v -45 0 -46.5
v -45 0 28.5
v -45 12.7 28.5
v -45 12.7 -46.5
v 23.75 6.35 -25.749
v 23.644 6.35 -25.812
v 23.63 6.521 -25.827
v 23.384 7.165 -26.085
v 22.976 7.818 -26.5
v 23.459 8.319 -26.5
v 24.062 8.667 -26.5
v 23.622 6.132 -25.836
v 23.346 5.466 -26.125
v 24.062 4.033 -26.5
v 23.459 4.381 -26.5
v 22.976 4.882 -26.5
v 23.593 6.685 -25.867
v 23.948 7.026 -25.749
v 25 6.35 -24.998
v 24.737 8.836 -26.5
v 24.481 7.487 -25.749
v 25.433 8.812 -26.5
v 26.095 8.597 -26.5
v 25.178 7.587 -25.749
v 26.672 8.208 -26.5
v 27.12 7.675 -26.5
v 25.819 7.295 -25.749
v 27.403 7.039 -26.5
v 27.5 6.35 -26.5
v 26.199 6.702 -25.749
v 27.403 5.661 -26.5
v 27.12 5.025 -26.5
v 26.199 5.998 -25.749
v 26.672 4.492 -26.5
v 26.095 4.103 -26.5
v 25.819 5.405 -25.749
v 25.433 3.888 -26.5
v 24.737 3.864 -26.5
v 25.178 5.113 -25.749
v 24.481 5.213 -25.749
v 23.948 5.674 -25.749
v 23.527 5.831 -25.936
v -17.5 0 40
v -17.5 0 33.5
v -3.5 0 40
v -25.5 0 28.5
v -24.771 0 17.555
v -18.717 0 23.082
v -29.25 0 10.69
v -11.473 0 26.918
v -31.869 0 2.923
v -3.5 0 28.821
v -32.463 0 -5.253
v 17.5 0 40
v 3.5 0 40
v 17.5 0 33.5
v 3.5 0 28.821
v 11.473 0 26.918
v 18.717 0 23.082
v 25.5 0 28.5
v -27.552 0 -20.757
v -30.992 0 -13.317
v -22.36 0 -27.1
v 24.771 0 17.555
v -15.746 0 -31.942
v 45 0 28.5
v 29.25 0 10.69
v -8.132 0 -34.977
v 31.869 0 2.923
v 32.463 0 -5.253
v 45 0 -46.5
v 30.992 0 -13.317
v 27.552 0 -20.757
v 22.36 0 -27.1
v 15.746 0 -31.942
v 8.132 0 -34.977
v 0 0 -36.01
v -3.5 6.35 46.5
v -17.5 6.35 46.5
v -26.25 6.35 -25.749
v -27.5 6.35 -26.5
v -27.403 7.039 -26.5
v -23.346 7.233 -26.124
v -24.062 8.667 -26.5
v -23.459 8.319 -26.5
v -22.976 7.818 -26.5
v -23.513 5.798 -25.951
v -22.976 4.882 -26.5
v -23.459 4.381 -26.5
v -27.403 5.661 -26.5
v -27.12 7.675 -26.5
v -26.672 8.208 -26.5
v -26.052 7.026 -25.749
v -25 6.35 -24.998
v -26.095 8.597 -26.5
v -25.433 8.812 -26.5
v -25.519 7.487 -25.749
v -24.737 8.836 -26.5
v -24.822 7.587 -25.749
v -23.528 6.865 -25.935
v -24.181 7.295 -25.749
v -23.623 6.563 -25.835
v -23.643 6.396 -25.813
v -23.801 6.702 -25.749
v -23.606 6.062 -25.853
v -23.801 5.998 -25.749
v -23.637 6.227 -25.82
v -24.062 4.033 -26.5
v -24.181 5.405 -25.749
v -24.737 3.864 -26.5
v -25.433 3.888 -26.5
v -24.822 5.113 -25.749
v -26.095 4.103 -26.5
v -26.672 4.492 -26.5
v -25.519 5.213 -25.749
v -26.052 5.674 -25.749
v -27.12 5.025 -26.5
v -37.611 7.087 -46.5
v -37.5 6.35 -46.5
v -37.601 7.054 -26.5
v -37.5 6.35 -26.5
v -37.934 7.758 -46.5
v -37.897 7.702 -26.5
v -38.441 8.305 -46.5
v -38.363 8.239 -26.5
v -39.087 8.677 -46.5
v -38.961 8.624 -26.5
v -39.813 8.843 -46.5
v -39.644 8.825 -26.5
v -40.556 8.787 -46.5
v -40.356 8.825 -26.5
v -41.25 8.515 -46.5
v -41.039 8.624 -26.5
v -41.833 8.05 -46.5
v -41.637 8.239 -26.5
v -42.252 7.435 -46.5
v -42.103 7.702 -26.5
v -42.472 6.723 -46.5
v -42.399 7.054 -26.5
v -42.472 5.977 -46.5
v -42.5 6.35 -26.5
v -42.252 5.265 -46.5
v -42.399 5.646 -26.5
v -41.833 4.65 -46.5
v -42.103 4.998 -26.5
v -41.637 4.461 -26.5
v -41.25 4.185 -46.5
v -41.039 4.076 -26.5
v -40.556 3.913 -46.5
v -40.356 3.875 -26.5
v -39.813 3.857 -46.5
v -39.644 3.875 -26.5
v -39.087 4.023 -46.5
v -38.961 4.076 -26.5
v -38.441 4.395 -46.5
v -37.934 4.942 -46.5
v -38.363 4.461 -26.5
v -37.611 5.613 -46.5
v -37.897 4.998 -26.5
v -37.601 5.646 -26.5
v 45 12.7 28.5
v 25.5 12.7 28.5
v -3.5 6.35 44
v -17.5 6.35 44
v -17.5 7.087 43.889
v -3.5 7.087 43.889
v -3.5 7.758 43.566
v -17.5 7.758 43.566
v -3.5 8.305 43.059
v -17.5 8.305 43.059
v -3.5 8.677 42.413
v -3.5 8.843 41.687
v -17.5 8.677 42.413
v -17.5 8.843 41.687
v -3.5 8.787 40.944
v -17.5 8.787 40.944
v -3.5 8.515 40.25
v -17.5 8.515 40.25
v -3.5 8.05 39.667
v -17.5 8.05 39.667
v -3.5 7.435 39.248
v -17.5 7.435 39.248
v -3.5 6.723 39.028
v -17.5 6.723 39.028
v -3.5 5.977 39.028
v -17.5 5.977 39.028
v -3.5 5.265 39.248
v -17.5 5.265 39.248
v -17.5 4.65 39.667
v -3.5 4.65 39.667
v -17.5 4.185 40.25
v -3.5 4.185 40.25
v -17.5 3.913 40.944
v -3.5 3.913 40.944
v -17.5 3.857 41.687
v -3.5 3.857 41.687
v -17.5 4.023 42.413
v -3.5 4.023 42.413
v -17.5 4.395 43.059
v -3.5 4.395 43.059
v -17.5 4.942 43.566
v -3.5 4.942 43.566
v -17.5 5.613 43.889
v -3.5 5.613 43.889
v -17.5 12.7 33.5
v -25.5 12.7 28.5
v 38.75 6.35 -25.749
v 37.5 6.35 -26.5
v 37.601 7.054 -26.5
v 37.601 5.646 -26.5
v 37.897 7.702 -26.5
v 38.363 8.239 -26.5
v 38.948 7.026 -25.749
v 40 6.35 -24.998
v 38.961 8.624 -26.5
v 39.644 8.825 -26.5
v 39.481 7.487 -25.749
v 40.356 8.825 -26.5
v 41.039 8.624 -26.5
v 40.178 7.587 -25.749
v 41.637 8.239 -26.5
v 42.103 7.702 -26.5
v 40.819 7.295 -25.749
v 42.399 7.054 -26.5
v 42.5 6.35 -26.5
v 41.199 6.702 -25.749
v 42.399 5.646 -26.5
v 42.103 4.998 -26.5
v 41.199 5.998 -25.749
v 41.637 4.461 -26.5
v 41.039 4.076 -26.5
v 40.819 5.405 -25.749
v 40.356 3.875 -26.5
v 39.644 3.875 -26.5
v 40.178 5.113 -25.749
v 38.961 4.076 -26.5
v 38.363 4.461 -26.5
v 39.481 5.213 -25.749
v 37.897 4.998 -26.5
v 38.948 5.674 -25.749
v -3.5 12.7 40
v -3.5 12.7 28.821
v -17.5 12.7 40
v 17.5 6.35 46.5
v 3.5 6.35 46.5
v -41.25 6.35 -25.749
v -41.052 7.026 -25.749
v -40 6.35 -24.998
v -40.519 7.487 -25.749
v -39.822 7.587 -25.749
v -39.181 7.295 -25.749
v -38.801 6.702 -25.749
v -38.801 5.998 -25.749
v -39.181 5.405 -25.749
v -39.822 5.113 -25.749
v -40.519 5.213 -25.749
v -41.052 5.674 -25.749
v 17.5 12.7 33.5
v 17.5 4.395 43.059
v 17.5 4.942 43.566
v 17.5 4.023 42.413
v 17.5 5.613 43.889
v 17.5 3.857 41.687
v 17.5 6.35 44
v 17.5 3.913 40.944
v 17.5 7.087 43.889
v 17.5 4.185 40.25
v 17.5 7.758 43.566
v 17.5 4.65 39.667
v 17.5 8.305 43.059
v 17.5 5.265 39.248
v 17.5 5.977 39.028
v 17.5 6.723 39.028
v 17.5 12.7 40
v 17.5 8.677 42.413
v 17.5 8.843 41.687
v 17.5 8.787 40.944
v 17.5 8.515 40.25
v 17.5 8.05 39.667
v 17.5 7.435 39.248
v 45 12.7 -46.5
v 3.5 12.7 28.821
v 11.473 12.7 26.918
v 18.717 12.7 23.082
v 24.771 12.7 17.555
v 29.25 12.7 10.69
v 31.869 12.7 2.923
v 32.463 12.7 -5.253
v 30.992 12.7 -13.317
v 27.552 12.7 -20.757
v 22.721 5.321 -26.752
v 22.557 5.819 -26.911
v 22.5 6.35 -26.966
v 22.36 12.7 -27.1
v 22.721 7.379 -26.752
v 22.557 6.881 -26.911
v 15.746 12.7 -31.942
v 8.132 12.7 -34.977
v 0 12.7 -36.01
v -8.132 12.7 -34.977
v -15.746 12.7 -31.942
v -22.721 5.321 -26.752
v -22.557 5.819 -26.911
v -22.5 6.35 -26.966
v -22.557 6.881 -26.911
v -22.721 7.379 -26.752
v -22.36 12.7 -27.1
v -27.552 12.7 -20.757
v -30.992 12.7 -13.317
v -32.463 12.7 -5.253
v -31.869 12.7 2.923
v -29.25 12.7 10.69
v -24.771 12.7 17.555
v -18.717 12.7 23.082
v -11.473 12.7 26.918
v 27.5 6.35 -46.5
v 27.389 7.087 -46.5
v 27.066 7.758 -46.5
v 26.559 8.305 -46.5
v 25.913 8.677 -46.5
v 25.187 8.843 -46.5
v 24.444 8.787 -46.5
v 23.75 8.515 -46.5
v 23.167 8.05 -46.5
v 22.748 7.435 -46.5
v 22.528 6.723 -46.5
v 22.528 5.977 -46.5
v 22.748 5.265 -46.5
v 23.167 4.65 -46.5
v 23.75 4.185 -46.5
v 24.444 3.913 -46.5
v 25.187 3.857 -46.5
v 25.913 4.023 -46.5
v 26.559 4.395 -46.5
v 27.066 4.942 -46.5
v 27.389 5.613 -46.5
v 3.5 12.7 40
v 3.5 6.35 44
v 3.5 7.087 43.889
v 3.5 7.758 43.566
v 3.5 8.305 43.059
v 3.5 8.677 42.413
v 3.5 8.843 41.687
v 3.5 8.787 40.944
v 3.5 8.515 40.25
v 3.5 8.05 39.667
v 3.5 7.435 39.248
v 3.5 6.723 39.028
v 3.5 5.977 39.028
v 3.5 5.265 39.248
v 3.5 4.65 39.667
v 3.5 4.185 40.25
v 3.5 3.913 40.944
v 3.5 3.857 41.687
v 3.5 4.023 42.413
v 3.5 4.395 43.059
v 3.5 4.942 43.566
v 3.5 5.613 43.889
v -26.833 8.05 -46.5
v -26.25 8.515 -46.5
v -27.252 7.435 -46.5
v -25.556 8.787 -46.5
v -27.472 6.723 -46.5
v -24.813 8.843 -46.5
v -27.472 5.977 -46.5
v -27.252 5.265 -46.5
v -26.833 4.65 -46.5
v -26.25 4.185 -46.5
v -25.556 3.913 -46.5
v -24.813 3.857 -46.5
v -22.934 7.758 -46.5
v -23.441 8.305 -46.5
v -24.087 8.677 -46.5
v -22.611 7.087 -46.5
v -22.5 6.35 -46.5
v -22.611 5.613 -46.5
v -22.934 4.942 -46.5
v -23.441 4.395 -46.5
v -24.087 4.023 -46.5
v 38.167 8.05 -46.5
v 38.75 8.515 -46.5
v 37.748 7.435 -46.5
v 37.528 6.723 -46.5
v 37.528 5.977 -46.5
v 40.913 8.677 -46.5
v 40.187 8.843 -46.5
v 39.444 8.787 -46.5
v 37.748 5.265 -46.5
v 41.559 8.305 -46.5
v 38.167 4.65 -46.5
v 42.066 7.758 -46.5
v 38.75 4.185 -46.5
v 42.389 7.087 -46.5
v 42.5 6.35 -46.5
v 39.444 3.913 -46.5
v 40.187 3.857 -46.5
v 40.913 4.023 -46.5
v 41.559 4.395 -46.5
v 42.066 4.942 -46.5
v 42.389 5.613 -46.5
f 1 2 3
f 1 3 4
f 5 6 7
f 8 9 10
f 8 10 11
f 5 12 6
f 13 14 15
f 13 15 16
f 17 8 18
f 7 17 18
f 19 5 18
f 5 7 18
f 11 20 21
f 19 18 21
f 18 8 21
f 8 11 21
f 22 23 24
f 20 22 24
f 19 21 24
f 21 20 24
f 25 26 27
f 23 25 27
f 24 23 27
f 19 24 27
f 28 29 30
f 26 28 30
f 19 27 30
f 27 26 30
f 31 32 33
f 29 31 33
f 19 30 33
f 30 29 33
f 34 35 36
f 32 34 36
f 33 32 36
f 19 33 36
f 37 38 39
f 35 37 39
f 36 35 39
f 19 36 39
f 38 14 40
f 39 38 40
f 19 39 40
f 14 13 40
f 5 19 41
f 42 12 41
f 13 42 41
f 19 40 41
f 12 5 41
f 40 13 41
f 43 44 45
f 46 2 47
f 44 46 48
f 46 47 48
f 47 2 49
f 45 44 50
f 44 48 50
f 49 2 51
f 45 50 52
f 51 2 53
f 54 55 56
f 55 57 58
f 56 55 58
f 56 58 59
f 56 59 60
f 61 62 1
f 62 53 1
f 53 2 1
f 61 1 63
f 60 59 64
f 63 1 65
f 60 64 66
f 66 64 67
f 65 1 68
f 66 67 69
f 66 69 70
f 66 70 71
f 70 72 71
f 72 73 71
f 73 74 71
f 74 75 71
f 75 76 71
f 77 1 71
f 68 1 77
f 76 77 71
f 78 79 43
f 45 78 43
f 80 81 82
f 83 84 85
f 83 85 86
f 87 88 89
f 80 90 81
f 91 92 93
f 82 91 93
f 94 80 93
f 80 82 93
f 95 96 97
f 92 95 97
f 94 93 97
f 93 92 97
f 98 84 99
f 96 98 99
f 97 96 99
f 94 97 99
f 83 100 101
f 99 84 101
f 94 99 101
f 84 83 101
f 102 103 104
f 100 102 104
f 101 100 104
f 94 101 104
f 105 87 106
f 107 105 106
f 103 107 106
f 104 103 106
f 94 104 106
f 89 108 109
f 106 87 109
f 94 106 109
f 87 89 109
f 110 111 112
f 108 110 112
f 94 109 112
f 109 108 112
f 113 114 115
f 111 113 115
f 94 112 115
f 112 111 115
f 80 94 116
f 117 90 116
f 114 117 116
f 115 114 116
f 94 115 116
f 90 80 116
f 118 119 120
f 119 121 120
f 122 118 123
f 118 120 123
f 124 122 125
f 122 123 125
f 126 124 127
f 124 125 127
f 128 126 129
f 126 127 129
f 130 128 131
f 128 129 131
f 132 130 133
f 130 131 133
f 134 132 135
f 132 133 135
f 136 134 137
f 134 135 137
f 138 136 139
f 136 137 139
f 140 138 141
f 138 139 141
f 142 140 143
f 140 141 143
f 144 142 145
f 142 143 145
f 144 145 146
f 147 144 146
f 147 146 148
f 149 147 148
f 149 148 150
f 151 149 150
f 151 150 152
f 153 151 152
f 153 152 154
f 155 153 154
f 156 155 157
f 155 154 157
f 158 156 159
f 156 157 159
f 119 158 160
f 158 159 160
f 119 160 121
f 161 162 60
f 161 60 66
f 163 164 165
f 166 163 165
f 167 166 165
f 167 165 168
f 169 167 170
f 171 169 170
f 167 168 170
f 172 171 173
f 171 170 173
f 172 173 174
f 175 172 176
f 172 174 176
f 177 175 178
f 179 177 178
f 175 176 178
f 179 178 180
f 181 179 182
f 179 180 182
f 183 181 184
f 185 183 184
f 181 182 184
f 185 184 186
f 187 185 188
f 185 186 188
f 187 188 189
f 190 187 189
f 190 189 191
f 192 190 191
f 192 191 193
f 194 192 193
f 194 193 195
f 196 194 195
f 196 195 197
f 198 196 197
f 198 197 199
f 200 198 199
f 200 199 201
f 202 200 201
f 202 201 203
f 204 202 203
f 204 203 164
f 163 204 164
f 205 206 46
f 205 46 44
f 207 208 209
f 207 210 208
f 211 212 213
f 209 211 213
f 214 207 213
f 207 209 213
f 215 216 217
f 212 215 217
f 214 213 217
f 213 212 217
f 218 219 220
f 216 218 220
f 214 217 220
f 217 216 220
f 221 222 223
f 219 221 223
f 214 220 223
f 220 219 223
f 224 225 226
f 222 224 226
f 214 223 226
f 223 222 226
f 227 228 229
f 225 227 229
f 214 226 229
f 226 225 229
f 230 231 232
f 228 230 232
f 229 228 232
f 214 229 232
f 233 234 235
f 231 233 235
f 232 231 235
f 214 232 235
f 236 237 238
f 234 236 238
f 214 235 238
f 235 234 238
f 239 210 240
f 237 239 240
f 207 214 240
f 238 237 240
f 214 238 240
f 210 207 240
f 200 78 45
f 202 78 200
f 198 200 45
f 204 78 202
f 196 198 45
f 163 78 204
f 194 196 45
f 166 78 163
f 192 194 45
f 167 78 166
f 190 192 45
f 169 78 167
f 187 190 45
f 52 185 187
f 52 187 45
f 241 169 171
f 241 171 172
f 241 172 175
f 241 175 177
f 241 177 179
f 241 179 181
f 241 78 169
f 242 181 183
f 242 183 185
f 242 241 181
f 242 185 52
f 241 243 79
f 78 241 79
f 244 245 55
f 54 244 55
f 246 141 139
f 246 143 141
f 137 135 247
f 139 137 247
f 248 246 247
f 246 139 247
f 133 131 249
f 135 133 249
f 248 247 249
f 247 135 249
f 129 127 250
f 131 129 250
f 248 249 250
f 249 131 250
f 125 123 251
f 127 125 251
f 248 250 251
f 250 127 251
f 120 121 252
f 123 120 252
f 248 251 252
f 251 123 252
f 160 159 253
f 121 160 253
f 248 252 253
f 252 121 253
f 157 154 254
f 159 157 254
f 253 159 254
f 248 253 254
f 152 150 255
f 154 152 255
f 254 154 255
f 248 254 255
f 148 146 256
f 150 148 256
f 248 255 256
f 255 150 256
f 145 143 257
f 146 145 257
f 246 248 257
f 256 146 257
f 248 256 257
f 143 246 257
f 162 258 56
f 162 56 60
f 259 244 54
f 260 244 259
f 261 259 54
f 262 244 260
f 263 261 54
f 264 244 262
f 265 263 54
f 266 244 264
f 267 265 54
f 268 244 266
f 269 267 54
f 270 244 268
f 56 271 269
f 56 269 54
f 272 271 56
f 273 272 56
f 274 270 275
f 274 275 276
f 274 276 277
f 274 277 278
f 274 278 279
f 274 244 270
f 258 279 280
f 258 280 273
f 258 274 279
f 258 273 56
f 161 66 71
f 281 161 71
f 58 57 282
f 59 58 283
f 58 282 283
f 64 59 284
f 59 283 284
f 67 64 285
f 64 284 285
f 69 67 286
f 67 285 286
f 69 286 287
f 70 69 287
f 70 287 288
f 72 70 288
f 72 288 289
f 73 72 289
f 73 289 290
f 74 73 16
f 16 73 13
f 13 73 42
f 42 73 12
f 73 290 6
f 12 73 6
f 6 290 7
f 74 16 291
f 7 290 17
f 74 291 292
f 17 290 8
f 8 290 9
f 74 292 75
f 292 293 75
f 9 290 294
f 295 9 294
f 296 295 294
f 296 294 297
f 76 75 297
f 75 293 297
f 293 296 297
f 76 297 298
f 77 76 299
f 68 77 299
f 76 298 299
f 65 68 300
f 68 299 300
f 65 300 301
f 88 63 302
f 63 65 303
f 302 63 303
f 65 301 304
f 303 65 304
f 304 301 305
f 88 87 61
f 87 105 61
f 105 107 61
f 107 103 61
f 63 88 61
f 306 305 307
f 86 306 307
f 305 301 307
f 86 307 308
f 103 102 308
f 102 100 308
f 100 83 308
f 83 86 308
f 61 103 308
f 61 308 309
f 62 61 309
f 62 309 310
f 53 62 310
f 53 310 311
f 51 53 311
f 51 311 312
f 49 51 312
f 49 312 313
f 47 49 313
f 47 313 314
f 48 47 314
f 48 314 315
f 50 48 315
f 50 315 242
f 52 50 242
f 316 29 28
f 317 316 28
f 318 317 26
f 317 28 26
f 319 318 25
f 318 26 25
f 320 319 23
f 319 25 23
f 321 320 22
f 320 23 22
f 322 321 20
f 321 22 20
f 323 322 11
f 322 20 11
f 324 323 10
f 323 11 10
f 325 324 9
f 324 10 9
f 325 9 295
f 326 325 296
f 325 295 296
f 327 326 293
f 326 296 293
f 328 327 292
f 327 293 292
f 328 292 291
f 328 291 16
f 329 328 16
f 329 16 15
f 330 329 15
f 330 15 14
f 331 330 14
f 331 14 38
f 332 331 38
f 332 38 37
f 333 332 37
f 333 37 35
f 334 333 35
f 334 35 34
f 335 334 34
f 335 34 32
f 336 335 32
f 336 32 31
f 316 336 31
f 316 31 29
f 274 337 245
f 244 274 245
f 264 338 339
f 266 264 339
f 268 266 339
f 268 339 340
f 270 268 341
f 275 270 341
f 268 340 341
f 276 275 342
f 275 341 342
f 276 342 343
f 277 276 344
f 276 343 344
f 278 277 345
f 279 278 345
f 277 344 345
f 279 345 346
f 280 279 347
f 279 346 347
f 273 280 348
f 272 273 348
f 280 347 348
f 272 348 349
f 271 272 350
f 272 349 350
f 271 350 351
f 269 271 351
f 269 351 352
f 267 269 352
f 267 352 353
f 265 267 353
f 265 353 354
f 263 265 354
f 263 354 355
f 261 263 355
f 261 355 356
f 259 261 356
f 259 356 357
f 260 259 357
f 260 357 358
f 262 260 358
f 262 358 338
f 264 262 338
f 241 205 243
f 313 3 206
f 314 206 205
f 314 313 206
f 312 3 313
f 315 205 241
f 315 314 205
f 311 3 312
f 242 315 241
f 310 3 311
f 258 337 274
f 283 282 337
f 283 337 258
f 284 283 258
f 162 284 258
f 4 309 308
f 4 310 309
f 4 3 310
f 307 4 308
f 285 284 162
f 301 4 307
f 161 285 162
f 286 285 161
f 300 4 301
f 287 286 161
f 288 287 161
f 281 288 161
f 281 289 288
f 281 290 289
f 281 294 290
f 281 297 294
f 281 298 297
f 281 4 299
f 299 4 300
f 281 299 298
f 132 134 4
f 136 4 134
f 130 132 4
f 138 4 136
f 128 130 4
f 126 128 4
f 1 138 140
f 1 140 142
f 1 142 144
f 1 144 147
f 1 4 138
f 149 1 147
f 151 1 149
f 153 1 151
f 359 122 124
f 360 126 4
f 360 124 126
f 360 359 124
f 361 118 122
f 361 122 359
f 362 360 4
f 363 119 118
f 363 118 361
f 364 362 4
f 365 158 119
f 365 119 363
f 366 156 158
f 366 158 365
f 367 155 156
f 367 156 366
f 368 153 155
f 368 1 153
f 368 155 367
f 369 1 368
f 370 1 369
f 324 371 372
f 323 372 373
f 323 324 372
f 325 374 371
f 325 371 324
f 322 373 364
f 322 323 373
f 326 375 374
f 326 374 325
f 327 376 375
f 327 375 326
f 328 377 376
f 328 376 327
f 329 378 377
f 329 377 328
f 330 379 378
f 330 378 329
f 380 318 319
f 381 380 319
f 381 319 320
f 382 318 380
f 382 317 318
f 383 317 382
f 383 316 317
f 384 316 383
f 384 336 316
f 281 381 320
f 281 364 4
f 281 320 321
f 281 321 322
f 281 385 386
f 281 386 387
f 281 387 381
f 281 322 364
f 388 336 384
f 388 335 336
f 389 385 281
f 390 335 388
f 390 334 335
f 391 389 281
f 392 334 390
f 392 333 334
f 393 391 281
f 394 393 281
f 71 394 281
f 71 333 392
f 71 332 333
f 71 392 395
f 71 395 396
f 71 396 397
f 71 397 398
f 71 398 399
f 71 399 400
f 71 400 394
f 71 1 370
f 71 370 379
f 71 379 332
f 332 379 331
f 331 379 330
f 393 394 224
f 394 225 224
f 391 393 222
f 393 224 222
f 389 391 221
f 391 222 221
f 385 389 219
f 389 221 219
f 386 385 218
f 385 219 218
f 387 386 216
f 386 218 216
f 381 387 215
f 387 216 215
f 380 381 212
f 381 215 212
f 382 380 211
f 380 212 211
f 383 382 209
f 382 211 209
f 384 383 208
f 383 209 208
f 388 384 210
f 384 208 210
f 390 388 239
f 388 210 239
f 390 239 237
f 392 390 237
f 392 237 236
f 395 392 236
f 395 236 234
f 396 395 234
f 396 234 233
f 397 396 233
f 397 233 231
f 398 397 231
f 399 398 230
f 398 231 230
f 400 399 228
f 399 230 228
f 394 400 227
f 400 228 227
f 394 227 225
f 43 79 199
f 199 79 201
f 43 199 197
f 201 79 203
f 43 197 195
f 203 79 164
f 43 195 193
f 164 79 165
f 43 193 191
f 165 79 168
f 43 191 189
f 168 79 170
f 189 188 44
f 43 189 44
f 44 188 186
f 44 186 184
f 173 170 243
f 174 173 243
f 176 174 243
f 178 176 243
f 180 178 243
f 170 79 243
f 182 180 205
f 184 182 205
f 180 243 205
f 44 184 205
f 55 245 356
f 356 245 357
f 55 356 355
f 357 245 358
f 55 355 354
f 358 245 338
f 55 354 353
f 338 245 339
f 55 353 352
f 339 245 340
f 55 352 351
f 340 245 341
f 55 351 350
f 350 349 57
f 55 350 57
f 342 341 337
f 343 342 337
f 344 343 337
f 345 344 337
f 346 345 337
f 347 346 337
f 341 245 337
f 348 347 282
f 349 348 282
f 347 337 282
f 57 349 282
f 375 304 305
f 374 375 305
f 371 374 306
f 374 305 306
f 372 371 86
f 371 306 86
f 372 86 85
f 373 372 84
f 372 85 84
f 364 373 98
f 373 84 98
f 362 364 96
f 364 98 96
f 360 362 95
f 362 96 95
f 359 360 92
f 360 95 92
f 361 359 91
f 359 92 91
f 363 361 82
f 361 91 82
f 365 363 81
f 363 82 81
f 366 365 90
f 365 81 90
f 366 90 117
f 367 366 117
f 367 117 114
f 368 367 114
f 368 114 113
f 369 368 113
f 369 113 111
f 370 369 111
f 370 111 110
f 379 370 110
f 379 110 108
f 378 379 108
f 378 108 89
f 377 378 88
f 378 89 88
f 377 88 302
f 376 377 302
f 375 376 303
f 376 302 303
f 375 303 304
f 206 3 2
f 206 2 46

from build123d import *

# Parameters (mm, degrees)
ESBO_O1_W                          = 90
ESBO_O1_H                          = 93
RESSALTO_EXTRUS_O1_DEPTH           = 12.7
ESBO_O3_R                          = 32.51
CORTE_EXTRUS_O2_DEPTH              = 66.943460631
CORTE_EXTRUS_O4_REACH              = 67.943
ESBO_O5_W                          = 27.5
ESBO_O5_H                          = 13
CORTE_EXTRUS_O5_REACH              = 67.943
ESBO_O6_W                          = 7
ESBO_O6_H                          = 26.329700269
CORTE_EXTRUS_O6_REACH              = 80.929
ESBO_O7_R                          = 2.5
CORTE_EXTRUS_O7_REACH              = 80.929
CORTE_EXTRUS_O8_DEPTH              = 66.943460631
TALADRO_DE_MARGEN_PARA_00001_D     = 5
TALADRO_DE_MARGEN_PARA_00001_DEPTH = 20
TALADRO_DE_MARGEN_PARA_00001_TIP   = 1.502151548


with BuildPart() as part:
    # Esboço1 → Ressalto-extrusão1 (new body)
    with BuildSketch(Plane(origin=(0, 0, 0), x_dir=(1, 0, 0), z_dir=(0, 1, 0))):
        Rectangle(ESBO_O1_W, ESBO_O1_H)
    extrude(amount=RESSALTO_EXTRUS_O1_DEPTH)

    # Esboço3 → Corte-extrusão2 (cut, through all)
    with BuildSketch(Plane(origin=(0, 12.7, 0), x_dir=(1, 0, 0), z_dir=(0, 1, 0))):
        with Locations(Location((0, 3.5, 0), (0, 0, 270))):
            Circle(ESBO_O3_R)
    extrude(amount=-CORTE_EXTRUS_O2_DEPTH, mode=Mode.SUBTRACT)

    # Esboço5 → Corte-extrusão4 (cut, up to next)
    with BuildSketch(Plane(origin=(0, 12.7, 0), x_dir=(1, 0, 0), z_dir=(0, 1, 0)), mode=Mode.PRIVATE) as corte_extrus_o4_sk1:
        with Locations((31.25, -40)):
            Rectangle(ESBO_O5_W, ESBO_O5_H)
    corte_extrus_o4_tool1 = extrude(corte_extrus_o4_sk1.sketch, amount=-CORTE_EXTRUS_O4_REACH, mode=Mode.PRIVATE) & part.part
    # Esboço5 → Corte-extrusão4 (cut, up to next)
    with BuildSketch(Plane(origin=(0, 12.7, 0), x_dir=(1, 0, 0), z_dir=(0, 1, 0)), mode=Mode.PRIVATE) as corte_extrus_o4_sk2:
        with Locations((-31.25, -40)):
            Rectangle(ESBO_O5_W, ESBO_O5_H)
    corte_extrus_o4_tool2 = extrude(corte_extrus_o4_sk2.sketch, amount=-CORTE_EXTRUS_O4_REACH, mode=Mode.PRIVATE) & part.part
    add(corte_extrus_o4_tool1.solids().sort_by_distance((31.25, 12.7, 40))[0], mode=Mode.SUBTRACT)
    add(corte_extrus_o4_tool2.solids().sort_by_distance((-31.25, 12.7, 40))[0], mode=Mode.SUBTRACT)

    # Esboço6 → Corte-extrusão5 (cut, up to next)
    with BuildSketch(Plane(origin=(0, 12.7, 0), x_dir=(1, 0, 0), z_dir=(0, 1, 0)), mode=Mode.PRIVATE) as corte_extrus_o5_sk1:
        with Locations((0, -33.335149866)):
            Rectangle(ESBO_O6_W, ESBO_O6_H)
    corte_extrus_o5_tool1 = extrude(corte_extrus_o5_sk1.sketch, amount=-CORTE_EXTRUS_O5_REACH, mode=Mode.PRIVATE) & part.part
    add(corte_extrus_o5_tool1.solids().sort_by_distance((0, 12.7, 33.33515))[0], mode=Mode.SUBTRACT)

    # Corte-extrusão6: up to this face of the body (flat: up to its plane)
    corte_extrus_o6_end = Plane(part.part.faces().sort_by_distance((17.5, 6.35, 40))[0])
    # Esboço7 → Corte-extrusão6 (cut, up to the picked face)
    with BuildSketch(Plane.ZY.offset(17.5), mode=Mode.PRIVATE) as corte_extrus_o6_sk1:
        with Locations((41.5, 6.35)):
            Circle(ESBO_O7_R)
    corte_extrus_o6_tool1 = split(extrude(corte_extrus_o6_sk1.sketch, amount=-CORTE_EXTRUS_O6_REACH, mode=Mode.PRIVATE), bisect_by=corte_extrus_o6_end, keep=Keep.BOTH, mode=Mode.PRIVATE)
    add(corte_extrus_o6_tool1.solids().sort_by(Axis((-17.5, 6.35, 41.5), (1, 0, 0)))[0], mode=Mode.SUBTRACT)

    # Corte-extrusão7: up to this face of the body (flat: up to its plane)
    corte_extrus_o7_end = Plane(part.part.faces().sort_by_distance((17.5, 12.518261176, 40))[0])
    # Esboço8 → Corte-extrusão7 (cut, up to the picked face)
    with BuildSketch(Plane.ZY.offset(17.5), mode=Mode.PRIVATE) as corte_extrus_o7_sk1:
        Polygon((46.5, 12.7), (40, 12.7), (46.5, 6.35), align=None)
    corte_extrus_o7_tool1 = split(extrude(corte_extrus_o7_sk1.sketch, amount=-CORTE_EXTRUS_O7_REACH, mode=Mode.PRIVATE), bisect_by=corte_extrus_o7_end, keep=Keep.BOTH, mode=Mode.PRIVATE)
    # Esboço8 → Corte-extrusão7 (cut, up to the picked face)
    with BuildSketch(Plane.ZY.offset(17.5), mode=Mode.PRIVATE) as corte_extrus_o7_sk2:
        Polygon((46.5, 0), (46.5, 6.35), (40, 0), align=None)
    corte_extrus_o7_tool2 = split(extrude(corte_extrus_o7_sk2.sketch, amount=-CORTE_EXTRUS_O7_REACH, mode=Mode.PRIVATE), bisect_by=corte_extrus_o7_end, keep=Keep.BOTH, mode=Mode.PRIVATE)
    add(corte_extrus_o7_tool1.solids().sort_by(Axis((-17.5, 10.583333, 44.333333), (1, 0, 0)))[0], mode=Mode.SUBTRACT)
    add(corte_extrus_o7_tool2.solids().sort_by(Axis((-17.5, 2.116667, 44.333333), (1, 0, 0)))[0], mode=Mode.SUBTRACT)

    # Esboço9 → Corte-extrusão8 (cut, through all)
    with BuildSketch(Plane(origin=(0, 12.7, 0), x_dir=(-1, 0, 0), z_dir=(0, 1, 0))):
        Polygon((45, 28.5), (25.5, 28.5), (17.5, 33.5), (25.5, 33.5), (45, 33.5), align=None)
        Polygon((-45, 33.5), (-25.5, 33.5), (-17.5, 33.5), (-25.5, 28.5), (-45, 28.5), align=None)
    extrude(amount=-CORTE_EXTRUS_O8_DEPTH, mode=Mode.SUBTRACT)

    # Taladro de margen para #00001
    with Locations(Plane(origin=(0, 0, -46.5), x_dir=(-1, 0, 0), z_dir=(0, 0, -1))):
        with Locations((-40, 6.35), (-25, 6.35), (40, 6.35), (25, 6.35)):
            Hole(TALADRO_DE_MARGEN_PARA_00001_D / 2, depth=TALADRO_DE_MARGEN_PARA_00001_DEPTH)
            with Locations((0, 0, -(TALADRO_DE_MARGEN_PARA_00001_DEPTH + TALADRO_DE_MARGEN_PARA_00001_TIP / 2))):  # 118° drill point
                Cone(0, TALADRO_DE_MARGEN_PARA_00001_D / 2, TALADRO_DE_MARGEN_PARA_00001_TIP, mode=Mode.SUBTRACT)


solid = part.part
